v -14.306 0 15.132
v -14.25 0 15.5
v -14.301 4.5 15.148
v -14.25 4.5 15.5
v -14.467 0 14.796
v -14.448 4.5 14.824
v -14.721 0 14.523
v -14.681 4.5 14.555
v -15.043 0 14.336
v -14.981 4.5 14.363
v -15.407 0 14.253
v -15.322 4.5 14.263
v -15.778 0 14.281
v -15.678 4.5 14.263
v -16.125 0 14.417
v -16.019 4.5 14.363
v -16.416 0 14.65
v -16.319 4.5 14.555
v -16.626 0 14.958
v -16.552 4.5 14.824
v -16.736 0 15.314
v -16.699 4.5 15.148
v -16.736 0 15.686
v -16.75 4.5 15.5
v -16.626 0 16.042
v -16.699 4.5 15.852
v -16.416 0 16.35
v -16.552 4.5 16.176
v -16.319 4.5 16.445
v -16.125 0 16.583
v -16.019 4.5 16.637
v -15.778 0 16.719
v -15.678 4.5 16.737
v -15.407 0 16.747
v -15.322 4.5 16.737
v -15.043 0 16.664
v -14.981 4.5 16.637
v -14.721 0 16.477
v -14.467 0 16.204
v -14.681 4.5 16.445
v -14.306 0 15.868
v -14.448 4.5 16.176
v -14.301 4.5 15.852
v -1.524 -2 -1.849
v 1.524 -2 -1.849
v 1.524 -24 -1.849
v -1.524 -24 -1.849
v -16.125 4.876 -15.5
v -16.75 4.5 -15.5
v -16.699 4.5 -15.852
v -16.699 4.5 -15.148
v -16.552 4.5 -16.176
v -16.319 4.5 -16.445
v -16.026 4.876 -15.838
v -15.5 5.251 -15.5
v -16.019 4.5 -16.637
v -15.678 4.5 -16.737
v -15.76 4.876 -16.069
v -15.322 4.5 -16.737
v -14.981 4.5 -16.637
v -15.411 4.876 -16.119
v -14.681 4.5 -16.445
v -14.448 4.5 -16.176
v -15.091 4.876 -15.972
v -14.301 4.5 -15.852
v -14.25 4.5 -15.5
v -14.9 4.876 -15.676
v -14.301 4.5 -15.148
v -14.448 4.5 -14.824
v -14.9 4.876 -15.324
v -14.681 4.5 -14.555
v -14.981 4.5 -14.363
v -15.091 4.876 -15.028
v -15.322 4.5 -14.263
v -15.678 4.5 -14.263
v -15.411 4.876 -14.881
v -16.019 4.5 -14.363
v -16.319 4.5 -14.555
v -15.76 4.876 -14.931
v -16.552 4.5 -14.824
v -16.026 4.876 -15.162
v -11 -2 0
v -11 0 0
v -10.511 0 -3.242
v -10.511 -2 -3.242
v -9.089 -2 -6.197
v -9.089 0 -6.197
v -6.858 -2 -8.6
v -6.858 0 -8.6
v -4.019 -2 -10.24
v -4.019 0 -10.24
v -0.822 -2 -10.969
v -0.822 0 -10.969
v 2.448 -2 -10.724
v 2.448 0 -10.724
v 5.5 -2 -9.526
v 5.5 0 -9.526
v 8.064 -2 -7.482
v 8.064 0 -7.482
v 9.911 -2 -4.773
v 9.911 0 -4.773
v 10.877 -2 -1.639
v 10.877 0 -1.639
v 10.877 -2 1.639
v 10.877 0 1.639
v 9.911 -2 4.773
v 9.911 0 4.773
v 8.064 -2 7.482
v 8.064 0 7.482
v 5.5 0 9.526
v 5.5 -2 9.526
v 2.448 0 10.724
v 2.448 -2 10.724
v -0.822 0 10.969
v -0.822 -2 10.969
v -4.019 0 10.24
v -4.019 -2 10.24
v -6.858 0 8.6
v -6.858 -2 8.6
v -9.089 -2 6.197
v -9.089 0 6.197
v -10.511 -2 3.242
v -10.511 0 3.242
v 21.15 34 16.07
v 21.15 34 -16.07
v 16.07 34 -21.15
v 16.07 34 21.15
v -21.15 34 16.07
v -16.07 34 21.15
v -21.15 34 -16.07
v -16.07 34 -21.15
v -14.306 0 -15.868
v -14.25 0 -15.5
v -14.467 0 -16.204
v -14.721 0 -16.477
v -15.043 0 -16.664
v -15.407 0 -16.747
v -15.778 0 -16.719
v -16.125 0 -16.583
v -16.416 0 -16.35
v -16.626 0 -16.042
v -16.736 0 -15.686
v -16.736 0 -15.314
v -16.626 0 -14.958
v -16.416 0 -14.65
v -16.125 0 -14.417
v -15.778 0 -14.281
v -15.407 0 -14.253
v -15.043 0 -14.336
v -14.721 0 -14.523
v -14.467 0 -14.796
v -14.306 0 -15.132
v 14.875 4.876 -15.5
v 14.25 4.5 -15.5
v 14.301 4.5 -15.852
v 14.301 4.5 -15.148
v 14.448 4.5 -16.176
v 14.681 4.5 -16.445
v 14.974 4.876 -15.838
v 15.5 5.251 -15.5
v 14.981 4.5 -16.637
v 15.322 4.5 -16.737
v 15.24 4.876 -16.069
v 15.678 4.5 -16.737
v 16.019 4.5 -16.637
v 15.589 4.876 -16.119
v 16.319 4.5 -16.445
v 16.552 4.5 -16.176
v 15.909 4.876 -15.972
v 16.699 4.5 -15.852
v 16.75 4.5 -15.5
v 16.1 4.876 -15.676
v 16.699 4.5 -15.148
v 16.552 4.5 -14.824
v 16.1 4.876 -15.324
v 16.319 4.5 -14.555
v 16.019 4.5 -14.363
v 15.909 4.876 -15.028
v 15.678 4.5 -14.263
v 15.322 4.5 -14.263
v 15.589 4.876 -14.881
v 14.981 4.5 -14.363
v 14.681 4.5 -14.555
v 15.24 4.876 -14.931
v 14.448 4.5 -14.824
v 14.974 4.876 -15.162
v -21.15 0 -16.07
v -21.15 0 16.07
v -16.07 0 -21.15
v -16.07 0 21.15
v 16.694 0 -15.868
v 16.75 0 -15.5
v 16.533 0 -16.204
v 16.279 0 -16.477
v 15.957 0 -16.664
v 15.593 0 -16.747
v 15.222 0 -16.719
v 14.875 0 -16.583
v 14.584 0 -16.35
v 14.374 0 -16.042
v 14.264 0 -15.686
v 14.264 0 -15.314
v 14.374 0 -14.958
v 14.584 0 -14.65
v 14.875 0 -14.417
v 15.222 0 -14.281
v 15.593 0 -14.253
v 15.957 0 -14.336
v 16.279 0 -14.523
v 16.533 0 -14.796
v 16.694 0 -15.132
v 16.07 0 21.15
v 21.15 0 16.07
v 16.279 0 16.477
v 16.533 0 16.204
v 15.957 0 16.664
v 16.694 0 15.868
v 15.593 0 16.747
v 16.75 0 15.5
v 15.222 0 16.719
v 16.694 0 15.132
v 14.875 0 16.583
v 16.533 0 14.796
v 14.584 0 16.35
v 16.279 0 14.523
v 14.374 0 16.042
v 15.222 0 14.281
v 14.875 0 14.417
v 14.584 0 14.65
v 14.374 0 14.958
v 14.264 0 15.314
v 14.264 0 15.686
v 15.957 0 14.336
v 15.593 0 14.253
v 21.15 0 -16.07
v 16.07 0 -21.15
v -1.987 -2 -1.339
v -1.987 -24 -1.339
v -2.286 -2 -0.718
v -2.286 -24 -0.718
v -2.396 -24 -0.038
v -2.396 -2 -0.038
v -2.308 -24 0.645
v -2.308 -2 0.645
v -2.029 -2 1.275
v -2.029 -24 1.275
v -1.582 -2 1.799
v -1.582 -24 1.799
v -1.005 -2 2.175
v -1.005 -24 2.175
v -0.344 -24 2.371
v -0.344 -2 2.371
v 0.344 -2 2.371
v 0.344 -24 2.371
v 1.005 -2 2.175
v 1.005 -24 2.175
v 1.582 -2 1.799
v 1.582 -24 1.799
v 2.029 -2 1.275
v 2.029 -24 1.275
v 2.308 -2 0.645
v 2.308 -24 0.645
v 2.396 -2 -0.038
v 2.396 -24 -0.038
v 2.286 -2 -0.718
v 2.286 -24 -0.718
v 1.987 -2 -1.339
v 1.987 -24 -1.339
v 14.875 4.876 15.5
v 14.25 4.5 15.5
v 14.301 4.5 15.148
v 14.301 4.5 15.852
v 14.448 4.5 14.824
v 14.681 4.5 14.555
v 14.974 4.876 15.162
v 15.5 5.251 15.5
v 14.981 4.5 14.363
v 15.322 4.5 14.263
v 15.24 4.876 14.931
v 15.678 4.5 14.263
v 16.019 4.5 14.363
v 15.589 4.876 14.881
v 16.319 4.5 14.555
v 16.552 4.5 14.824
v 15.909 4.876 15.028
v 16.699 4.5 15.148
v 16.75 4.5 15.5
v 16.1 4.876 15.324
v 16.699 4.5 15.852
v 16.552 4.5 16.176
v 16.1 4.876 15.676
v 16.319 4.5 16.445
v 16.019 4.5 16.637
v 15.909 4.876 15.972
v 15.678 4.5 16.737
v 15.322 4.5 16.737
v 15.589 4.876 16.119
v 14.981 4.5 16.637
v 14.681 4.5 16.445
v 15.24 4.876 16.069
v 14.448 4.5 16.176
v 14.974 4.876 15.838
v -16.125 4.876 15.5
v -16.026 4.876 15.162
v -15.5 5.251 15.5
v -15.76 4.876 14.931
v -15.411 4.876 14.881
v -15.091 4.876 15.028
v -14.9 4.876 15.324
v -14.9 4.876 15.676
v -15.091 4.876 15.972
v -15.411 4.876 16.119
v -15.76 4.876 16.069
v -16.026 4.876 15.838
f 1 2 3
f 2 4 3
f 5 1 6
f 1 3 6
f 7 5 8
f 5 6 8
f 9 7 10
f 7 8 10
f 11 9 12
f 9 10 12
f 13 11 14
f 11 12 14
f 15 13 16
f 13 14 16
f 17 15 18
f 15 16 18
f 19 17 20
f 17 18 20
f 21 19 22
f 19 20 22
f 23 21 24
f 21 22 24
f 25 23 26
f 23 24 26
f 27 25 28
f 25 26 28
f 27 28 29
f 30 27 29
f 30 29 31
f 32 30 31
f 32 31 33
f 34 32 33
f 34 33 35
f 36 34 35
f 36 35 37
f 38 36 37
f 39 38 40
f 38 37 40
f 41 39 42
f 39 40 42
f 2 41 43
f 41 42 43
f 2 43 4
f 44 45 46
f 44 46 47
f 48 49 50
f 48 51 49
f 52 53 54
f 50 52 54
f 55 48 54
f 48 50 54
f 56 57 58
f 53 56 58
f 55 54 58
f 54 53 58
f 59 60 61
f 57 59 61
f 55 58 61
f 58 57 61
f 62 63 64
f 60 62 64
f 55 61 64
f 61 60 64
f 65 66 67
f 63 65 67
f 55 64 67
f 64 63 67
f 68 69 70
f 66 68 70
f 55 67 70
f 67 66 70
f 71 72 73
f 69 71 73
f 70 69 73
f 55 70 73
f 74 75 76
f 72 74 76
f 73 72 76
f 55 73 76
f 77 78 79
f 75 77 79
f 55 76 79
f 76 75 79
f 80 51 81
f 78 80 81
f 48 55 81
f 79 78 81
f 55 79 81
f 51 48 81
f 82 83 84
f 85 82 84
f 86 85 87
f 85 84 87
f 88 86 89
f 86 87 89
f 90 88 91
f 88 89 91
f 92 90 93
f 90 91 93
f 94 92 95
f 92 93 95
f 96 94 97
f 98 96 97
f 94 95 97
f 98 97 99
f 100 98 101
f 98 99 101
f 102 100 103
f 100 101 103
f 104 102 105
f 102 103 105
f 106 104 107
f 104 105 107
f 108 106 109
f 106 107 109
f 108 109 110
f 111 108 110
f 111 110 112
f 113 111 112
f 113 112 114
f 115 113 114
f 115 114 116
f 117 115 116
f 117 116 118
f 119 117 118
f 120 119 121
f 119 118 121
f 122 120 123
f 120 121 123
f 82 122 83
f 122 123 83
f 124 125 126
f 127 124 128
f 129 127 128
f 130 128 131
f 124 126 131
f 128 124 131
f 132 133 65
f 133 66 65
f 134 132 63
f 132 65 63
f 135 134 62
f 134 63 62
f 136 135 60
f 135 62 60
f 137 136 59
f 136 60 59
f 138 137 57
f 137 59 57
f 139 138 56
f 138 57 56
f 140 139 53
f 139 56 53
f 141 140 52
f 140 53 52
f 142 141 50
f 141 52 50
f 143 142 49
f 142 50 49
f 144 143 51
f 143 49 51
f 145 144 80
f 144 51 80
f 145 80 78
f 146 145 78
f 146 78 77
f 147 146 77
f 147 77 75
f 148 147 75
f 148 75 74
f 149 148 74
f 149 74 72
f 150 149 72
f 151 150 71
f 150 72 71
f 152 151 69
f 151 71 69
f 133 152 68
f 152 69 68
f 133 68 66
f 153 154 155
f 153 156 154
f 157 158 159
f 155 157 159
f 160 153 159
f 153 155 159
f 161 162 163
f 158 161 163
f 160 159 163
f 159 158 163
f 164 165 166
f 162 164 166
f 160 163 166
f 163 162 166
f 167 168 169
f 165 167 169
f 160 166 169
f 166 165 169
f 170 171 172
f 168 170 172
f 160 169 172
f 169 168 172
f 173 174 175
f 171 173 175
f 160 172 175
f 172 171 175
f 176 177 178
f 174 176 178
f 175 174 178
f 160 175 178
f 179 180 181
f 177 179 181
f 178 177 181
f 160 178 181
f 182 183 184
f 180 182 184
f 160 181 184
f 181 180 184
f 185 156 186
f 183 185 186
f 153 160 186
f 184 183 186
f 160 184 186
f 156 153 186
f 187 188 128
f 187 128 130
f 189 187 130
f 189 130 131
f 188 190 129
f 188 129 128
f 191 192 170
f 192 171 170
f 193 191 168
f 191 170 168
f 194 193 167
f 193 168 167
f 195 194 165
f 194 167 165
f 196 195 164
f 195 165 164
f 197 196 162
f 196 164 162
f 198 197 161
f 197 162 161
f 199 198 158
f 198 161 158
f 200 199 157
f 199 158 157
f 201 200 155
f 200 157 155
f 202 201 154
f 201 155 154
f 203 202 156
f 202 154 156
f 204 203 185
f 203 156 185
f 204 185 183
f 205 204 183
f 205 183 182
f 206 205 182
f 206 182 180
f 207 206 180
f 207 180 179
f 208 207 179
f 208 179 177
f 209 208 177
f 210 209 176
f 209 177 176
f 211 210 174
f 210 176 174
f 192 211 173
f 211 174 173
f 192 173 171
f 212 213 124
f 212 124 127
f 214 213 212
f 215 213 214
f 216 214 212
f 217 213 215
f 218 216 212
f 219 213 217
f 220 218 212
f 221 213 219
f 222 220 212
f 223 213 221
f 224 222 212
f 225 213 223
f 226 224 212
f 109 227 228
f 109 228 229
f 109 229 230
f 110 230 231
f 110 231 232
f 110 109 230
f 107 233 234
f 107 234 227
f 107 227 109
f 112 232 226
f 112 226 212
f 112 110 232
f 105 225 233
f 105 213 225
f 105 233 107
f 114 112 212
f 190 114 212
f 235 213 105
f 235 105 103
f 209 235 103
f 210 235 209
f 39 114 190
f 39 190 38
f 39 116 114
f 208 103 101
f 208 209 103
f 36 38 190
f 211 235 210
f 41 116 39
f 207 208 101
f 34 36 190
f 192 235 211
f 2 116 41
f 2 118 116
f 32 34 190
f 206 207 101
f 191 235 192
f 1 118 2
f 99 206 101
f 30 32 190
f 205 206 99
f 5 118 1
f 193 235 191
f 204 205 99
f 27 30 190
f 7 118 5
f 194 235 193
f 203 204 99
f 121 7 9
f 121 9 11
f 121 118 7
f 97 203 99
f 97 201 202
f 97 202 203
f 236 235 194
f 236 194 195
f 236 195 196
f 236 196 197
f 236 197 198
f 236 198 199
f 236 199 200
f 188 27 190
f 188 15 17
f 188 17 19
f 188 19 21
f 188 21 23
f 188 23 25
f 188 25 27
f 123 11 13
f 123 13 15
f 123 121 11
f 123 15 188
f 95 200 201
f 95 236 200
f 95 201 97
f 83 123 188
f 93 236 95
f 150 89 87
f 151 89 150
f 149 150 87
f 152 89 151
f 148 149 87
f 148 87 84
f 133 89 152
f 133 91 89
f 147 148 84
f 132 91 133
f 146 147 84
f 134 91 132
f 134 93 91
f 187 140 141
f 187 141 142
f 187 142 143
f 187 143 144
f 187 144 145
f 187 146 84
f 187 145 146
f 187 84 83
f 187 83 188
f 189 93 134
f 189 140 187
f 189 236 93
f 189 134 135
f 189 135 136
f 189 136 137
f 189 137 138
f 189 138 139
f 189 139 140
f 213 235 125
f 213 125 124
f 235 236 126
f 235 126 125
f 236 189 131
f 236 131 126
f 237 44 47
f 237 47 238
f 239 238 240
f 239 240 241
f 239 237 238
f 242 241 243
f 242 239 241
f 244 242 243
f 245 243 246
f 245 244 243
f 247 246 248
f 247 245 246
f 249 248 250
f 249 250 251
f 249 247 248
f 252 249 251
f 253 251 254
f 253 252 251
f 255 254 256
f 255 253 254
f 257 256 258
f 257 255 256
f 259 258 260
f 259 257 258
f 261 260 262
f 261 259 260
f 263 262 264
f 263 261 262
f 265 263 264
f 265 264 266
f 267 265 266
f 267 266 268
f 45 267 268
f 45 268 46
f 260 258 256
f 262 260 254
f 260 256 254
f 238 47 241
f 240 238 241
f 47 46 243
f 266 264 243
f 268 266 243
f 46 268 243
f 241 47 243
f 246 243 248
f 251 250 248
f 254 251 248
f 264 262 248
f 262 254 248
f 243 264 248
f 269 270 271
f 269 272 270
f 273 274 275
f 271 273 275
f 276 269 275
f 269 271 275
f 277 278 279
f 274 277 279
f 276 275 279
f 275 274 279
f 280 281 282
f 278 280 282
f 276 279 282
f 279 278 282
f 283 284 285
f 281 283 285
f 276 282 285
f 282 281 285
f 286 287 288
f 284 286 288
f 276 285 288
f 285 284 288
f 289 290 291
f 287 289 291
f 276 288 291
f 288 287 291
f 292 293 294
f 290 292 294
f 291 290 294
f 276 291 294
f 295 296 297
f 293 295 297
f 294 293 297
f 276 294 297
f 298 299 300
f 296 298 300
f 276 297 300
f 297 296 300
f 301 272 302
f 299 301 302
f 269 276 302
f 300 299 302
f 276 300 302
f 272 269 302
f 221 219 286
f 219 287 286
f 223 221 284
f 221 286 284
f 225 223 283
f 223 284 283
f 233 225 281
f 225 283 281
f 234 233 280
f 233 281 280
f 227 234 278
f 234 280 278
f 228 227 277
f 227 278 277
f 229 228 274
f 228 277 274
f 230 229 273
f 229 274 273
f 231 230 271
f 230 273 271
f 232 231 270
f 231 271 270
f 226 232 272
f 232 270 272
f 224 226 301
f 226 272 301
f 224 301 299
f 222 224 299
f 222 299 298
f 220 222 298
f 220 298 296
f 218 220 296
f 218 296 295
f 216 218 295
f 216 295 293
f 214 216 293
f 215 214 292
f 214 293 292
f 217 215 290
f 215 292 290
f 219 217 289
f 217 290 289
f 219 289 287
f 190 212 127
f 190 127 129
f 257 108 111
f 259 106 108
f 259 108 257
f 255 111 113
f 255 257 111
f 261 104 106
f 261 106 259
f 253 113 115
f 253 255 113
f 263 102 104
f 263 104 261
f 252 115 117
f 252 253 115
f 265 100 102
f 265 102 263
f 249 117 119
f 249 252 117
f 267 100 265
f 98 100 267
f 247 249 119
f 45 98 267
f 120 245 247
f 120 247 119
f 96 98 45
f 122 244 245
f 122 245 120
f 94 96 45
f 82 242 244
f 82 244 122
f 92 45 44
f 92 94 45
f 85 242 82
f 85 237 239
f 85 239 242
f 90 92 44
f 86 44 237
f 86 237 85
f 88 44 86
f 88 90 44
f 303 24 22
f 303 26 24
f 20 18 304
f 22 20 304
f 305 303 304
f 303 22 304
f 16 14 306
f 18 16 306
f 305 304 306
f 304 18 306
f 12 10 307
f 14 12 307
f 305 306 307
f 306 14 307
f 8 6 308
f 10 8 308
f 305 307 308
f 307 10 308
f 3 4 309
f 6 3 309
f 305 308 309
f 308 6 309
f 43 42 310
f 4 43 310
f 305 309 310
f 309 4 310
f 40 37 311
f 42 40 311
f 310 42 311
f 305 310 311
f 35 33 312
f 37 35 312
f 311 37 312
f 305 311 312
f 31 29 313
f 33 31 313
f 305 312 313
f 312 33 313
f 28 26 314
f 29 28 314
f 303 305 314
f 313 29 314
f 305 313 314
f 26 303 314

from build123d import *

# Parameters (mm, degrees)
BOSS_EXTRUDE1_DEPTH       = 34
M3X0_5_TAPPED_HOLE1_D     = 2.5
M3X0_5_TAPPED_HOLE1_DEPTH = 4.499991
M3X0_5_TAPPED_HOLE1_TIP   = 0.751075774
SKETCH4_R                 = 11
BOSS_EXTRUDE2_DEPTH       = 2
BOSS_EXTRUDE3_DEPTH       = 22


with BuildPart() as part:
    # Sketch1 → Boss-Extrude1 (new body)
    with BuildSketch(Plane(origin=(0, 0, 0), x_dir=(1, 0, 0), z_dir=(0, 1, 0))):
        Polygon((-21.15, -16.07), (-21.15, 16.07), (-16.07, 21.15), (16.07, 21.15), (21.15, 16.07), (21.15, -16.07), (16.07, -21.15), (-16.07, -21.15), align=None)
    extrude(amount=BOSS_EXTRUDE1_DEPTH)

    # M3x0.5 Tapped Hole1
    with Locations(Plane(origin=(0, 0, 0), x_dir=(-1, 0, 0), z_dir=(0, -1, 0))):
        with Locations((-15.5, 15.5), (15.5, 15.5), (15.5, -15.5), (-15.5, -15.5)):
            Hole(M3X0_5_TAPPED_HOLE1_D / 2, depth=M3X0_5_TAPPED_HOLE1_DEPTH)
            with Locations((0, 0, -(M3X0_5_TAPPED_HOLE1_DEPTH + M3X0_5_TAPPED_HOLE1_TIP / 2))):  # 118° drill point
                Cone(0, M3X0_5_TAPPED_HOLE1_D / 2, M3X0_5_TAPPED_HOLE1_TIP, mode=Mode.SUBTRACT)

    # Sketch4 → Boss-Extrude2 (add)
    with BuildSketch(Plane(origin=(0, 0, 0), x_dir=(-1, 0, 0), z_dir=(0, -1, 0))):
        Circle(SKETCH4_R)
    extrude(amount=BOSS_EXTRUDE2_DEPTH)

    # Sketch5 → Boss-Extrude3 (add)
    with BuildSketch(Plane.XZ.offset(2)):
        with BuildLine():
            Line((1.524, -1.848854431), (-1.524, -1.848854431))
            ThreePointArc((-1.524, -1.848854431), (0, 2.396004738), (1.524, -1.848854431))
        make_face()
    extrude(amount=BOSS_EXTRUDE3_DEPTH)


solid = part.part
